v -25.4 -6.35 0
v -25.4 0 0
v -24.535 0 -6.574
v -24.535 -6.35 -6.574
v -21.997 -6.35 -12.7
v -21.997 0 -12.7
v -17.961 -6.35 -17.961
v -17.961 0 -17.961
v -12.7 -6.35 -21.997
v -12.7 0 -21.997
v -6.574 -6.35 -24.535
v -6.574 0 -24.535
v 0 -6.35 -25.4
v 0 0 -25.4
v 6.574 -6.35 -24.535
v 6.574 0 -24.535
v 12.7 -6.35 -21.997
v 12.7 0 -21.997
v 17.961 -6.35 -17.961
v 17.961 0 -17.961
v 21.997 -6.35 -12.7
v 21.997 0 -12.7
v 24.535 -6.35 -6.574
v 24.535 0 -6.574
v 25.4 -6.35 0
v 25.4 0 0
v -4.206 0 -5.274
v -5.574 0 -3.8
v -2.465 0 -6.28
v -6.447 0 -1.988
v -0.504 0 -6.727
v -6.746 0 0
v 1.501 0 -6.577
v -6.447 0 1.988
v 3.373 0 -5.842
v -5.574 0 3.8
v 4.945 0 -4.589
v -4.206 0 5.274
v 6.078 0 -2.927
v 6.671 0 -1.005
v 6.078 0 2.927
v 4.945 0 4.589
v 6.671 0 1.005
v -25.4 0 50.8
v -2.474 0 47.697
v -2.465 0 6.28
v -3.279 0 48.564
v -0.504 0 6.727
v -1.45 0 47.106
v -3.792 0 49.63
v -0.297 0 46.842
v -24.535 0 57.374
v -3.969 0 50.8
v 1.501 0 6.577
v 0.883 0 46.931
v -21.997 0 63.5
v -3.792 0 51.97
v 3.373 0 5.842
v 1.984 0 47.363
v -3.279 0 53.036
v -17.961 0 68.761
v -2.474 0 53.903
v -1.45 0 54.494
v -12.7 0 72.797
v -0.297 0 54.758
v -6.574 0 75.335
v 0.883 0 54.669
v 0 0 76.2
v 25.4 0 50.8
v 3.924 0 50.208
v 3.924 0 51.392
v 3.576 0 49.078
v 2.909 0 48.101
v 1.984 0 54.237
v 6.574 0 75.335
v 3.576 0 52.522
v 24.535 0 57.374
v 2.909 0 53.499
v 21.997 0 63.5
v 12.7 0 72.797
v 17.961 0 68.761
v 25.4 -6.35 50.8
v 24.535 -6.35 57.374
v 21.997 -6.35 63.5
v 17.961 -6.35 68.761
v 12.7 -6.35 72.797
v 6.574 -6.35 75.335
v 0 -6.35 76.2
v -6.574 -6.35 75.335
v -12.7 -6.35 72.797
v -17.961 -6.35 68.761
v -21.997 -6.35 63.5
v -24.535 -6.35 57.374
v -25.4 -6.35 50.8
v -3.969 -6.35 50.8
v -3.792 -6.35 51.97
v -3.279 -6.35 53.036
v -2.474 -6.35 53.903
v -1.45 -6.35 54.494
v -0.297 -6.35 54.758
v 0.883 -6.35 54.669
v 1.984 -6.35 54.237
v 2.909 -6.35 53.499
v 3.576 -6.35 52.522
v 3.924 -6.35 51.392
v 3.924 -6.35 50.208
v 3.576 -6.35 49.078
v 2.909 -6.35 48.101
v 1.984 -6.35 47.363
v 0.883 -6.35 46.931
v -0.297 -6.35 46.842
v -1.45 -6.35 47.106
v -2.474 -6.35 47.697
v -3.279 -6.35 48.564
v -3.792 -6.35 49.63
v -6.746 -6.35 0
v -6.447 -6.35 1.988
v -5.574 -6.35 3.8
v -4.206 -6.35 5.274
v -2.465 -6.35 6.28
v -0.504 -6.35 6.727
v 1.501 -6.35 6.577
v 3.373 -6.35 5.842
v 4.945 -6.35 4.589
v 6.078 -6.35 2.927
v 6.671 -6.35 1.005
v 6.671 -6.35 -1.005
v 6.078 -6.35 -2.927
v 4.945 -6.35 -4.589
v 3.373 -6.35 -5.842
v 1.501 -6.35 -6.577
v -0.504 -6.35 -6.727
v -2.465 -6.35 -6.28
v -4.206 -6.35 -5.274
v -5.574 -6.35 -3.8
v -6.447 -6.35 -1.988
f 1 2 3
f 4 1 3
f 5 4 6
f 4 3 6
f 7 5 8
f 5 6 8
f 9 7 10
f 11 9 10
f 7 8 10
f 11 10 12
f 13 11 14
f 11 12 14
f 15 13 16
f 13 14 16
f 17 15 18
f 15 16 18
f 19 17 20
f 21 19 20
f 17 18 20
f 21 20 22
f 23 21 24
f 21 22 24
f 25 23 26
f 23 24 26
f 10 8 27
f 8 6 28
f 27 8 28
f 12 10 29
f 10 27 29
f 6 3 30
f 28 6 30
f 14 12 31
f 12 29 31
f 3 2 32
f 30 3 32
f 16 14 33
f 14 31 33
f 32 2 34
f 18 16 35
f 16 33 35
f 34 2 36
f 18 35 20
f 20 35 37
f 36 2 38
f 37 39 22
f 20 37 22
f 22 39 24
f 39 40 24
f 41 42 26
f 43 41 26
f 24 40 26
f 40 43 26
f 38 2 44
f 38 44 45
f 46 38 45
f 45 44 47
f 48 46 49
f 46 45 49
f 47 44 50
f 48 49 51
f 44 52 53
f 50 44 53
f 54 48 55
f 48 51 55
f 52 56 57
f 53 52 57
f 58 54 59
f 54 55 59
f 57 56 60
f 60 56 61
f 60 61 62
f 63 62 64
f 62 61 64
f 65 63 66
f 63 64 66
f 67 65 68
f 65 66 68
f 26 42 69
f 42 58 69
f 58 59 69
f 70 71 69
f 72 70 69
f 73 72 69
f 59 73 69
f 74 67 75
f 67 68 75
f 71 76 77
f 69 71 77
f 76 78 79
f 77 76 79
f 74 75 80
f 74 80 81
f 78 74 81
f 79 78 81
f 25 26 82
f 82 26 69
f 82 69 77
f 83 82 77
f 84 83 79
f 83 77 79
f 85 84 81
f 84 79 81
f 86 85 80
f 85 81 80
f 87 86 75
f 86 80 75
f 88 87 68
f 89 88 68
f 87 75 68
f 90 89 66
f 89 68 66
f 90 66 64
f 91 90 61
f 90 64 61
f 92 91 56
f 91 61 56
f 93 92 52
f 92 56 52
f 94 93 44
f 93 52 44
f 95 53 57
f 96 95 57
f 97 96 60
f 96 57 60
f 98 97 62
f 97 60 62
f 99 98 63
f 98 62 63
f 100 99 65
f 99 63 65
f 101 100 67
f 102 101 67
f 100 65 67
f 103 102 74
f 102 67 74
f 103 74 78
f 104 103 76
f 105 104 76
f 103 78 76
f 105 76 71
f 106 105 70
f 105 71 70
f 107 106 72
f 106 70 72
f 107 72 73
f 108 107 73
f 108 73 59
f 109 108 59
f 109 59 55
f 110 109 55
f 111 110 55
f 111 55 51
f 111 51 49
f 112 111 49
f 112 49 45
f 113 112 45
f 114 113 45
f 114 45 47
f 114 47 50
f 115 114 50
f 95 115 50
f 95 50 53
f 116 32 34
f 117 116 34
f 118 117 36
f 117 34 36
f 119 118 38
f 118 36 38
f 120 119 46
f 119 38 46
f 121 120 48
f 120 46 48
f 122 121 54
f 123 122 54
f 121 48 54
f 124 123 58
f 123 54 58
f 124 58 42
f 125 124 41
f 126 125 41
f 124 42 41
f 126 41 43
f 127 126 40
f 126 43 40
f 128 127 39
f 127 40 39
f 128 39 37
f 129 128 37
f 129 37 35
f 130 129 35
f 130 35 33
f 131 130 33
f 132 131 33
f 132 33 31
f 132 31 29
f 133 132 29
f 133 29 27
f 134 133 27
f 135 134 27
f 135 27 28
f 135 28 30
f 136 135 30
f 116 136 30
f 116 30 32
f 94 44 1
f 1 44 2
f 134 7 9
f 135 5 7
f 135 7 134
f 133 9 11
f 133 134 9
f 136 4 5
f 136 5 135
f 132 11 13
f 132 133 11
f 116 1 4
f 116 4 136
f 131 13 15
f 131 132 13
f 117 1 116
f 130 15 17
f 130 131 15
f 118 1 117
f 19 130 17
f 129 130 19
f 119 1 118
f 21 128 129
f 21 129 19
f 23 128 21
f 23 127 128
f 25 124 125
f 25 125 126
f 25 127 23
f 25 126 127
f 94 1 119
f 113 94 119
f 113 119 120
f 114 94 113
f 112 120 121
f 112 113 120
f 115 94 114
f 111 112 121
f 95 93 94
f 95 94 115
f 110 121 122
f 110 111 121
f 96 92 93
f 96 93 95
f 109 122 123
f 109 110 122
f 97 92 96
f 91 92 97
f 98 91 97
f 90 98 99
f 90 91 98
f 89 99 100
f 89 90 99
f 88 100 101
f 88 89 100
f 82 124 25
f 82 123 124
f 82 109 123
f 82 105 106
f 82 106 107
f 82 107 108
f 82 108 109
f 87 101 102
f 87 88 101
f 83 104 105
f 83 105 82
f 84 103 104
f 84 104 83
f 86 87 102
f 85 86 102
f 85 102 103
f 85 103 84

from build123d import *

# Parameters (mm, degrees)
F1_DEPTH = 6.35
F3_D     = 7.9375
F5_D     = 13.49248


with BuildPart() as f1:
    # F0 (on Front) → F1 (new body)
    with BuildSketch(Plane.XZ):
        with BuildLine():
            Line((-25.4, 50.8), (-25.4, 0))
            ThreePointArc((-25.4, 0), (0, -25.4), (25.4, 0))
            Line((25.4, 0), (25.4, 50.8))
            ThreePointArc((25.4, 50.8), (0, 76.2), (-25.4, 50.8))
        make_face()
    extrude(amount=F1_DEPTH)

    # F3 (through all)
    with Locations(Plane.XZ.offset(6.35)):
        with Locations((0, 50.8)):
            Hole(F3_D / 2)

    # F5 (through all)
    with Locations(Plane.XZ.offset(6.35)):
        with Locations((0, 0)):
            Hole(F5_D / 2)


solid = f1.part
